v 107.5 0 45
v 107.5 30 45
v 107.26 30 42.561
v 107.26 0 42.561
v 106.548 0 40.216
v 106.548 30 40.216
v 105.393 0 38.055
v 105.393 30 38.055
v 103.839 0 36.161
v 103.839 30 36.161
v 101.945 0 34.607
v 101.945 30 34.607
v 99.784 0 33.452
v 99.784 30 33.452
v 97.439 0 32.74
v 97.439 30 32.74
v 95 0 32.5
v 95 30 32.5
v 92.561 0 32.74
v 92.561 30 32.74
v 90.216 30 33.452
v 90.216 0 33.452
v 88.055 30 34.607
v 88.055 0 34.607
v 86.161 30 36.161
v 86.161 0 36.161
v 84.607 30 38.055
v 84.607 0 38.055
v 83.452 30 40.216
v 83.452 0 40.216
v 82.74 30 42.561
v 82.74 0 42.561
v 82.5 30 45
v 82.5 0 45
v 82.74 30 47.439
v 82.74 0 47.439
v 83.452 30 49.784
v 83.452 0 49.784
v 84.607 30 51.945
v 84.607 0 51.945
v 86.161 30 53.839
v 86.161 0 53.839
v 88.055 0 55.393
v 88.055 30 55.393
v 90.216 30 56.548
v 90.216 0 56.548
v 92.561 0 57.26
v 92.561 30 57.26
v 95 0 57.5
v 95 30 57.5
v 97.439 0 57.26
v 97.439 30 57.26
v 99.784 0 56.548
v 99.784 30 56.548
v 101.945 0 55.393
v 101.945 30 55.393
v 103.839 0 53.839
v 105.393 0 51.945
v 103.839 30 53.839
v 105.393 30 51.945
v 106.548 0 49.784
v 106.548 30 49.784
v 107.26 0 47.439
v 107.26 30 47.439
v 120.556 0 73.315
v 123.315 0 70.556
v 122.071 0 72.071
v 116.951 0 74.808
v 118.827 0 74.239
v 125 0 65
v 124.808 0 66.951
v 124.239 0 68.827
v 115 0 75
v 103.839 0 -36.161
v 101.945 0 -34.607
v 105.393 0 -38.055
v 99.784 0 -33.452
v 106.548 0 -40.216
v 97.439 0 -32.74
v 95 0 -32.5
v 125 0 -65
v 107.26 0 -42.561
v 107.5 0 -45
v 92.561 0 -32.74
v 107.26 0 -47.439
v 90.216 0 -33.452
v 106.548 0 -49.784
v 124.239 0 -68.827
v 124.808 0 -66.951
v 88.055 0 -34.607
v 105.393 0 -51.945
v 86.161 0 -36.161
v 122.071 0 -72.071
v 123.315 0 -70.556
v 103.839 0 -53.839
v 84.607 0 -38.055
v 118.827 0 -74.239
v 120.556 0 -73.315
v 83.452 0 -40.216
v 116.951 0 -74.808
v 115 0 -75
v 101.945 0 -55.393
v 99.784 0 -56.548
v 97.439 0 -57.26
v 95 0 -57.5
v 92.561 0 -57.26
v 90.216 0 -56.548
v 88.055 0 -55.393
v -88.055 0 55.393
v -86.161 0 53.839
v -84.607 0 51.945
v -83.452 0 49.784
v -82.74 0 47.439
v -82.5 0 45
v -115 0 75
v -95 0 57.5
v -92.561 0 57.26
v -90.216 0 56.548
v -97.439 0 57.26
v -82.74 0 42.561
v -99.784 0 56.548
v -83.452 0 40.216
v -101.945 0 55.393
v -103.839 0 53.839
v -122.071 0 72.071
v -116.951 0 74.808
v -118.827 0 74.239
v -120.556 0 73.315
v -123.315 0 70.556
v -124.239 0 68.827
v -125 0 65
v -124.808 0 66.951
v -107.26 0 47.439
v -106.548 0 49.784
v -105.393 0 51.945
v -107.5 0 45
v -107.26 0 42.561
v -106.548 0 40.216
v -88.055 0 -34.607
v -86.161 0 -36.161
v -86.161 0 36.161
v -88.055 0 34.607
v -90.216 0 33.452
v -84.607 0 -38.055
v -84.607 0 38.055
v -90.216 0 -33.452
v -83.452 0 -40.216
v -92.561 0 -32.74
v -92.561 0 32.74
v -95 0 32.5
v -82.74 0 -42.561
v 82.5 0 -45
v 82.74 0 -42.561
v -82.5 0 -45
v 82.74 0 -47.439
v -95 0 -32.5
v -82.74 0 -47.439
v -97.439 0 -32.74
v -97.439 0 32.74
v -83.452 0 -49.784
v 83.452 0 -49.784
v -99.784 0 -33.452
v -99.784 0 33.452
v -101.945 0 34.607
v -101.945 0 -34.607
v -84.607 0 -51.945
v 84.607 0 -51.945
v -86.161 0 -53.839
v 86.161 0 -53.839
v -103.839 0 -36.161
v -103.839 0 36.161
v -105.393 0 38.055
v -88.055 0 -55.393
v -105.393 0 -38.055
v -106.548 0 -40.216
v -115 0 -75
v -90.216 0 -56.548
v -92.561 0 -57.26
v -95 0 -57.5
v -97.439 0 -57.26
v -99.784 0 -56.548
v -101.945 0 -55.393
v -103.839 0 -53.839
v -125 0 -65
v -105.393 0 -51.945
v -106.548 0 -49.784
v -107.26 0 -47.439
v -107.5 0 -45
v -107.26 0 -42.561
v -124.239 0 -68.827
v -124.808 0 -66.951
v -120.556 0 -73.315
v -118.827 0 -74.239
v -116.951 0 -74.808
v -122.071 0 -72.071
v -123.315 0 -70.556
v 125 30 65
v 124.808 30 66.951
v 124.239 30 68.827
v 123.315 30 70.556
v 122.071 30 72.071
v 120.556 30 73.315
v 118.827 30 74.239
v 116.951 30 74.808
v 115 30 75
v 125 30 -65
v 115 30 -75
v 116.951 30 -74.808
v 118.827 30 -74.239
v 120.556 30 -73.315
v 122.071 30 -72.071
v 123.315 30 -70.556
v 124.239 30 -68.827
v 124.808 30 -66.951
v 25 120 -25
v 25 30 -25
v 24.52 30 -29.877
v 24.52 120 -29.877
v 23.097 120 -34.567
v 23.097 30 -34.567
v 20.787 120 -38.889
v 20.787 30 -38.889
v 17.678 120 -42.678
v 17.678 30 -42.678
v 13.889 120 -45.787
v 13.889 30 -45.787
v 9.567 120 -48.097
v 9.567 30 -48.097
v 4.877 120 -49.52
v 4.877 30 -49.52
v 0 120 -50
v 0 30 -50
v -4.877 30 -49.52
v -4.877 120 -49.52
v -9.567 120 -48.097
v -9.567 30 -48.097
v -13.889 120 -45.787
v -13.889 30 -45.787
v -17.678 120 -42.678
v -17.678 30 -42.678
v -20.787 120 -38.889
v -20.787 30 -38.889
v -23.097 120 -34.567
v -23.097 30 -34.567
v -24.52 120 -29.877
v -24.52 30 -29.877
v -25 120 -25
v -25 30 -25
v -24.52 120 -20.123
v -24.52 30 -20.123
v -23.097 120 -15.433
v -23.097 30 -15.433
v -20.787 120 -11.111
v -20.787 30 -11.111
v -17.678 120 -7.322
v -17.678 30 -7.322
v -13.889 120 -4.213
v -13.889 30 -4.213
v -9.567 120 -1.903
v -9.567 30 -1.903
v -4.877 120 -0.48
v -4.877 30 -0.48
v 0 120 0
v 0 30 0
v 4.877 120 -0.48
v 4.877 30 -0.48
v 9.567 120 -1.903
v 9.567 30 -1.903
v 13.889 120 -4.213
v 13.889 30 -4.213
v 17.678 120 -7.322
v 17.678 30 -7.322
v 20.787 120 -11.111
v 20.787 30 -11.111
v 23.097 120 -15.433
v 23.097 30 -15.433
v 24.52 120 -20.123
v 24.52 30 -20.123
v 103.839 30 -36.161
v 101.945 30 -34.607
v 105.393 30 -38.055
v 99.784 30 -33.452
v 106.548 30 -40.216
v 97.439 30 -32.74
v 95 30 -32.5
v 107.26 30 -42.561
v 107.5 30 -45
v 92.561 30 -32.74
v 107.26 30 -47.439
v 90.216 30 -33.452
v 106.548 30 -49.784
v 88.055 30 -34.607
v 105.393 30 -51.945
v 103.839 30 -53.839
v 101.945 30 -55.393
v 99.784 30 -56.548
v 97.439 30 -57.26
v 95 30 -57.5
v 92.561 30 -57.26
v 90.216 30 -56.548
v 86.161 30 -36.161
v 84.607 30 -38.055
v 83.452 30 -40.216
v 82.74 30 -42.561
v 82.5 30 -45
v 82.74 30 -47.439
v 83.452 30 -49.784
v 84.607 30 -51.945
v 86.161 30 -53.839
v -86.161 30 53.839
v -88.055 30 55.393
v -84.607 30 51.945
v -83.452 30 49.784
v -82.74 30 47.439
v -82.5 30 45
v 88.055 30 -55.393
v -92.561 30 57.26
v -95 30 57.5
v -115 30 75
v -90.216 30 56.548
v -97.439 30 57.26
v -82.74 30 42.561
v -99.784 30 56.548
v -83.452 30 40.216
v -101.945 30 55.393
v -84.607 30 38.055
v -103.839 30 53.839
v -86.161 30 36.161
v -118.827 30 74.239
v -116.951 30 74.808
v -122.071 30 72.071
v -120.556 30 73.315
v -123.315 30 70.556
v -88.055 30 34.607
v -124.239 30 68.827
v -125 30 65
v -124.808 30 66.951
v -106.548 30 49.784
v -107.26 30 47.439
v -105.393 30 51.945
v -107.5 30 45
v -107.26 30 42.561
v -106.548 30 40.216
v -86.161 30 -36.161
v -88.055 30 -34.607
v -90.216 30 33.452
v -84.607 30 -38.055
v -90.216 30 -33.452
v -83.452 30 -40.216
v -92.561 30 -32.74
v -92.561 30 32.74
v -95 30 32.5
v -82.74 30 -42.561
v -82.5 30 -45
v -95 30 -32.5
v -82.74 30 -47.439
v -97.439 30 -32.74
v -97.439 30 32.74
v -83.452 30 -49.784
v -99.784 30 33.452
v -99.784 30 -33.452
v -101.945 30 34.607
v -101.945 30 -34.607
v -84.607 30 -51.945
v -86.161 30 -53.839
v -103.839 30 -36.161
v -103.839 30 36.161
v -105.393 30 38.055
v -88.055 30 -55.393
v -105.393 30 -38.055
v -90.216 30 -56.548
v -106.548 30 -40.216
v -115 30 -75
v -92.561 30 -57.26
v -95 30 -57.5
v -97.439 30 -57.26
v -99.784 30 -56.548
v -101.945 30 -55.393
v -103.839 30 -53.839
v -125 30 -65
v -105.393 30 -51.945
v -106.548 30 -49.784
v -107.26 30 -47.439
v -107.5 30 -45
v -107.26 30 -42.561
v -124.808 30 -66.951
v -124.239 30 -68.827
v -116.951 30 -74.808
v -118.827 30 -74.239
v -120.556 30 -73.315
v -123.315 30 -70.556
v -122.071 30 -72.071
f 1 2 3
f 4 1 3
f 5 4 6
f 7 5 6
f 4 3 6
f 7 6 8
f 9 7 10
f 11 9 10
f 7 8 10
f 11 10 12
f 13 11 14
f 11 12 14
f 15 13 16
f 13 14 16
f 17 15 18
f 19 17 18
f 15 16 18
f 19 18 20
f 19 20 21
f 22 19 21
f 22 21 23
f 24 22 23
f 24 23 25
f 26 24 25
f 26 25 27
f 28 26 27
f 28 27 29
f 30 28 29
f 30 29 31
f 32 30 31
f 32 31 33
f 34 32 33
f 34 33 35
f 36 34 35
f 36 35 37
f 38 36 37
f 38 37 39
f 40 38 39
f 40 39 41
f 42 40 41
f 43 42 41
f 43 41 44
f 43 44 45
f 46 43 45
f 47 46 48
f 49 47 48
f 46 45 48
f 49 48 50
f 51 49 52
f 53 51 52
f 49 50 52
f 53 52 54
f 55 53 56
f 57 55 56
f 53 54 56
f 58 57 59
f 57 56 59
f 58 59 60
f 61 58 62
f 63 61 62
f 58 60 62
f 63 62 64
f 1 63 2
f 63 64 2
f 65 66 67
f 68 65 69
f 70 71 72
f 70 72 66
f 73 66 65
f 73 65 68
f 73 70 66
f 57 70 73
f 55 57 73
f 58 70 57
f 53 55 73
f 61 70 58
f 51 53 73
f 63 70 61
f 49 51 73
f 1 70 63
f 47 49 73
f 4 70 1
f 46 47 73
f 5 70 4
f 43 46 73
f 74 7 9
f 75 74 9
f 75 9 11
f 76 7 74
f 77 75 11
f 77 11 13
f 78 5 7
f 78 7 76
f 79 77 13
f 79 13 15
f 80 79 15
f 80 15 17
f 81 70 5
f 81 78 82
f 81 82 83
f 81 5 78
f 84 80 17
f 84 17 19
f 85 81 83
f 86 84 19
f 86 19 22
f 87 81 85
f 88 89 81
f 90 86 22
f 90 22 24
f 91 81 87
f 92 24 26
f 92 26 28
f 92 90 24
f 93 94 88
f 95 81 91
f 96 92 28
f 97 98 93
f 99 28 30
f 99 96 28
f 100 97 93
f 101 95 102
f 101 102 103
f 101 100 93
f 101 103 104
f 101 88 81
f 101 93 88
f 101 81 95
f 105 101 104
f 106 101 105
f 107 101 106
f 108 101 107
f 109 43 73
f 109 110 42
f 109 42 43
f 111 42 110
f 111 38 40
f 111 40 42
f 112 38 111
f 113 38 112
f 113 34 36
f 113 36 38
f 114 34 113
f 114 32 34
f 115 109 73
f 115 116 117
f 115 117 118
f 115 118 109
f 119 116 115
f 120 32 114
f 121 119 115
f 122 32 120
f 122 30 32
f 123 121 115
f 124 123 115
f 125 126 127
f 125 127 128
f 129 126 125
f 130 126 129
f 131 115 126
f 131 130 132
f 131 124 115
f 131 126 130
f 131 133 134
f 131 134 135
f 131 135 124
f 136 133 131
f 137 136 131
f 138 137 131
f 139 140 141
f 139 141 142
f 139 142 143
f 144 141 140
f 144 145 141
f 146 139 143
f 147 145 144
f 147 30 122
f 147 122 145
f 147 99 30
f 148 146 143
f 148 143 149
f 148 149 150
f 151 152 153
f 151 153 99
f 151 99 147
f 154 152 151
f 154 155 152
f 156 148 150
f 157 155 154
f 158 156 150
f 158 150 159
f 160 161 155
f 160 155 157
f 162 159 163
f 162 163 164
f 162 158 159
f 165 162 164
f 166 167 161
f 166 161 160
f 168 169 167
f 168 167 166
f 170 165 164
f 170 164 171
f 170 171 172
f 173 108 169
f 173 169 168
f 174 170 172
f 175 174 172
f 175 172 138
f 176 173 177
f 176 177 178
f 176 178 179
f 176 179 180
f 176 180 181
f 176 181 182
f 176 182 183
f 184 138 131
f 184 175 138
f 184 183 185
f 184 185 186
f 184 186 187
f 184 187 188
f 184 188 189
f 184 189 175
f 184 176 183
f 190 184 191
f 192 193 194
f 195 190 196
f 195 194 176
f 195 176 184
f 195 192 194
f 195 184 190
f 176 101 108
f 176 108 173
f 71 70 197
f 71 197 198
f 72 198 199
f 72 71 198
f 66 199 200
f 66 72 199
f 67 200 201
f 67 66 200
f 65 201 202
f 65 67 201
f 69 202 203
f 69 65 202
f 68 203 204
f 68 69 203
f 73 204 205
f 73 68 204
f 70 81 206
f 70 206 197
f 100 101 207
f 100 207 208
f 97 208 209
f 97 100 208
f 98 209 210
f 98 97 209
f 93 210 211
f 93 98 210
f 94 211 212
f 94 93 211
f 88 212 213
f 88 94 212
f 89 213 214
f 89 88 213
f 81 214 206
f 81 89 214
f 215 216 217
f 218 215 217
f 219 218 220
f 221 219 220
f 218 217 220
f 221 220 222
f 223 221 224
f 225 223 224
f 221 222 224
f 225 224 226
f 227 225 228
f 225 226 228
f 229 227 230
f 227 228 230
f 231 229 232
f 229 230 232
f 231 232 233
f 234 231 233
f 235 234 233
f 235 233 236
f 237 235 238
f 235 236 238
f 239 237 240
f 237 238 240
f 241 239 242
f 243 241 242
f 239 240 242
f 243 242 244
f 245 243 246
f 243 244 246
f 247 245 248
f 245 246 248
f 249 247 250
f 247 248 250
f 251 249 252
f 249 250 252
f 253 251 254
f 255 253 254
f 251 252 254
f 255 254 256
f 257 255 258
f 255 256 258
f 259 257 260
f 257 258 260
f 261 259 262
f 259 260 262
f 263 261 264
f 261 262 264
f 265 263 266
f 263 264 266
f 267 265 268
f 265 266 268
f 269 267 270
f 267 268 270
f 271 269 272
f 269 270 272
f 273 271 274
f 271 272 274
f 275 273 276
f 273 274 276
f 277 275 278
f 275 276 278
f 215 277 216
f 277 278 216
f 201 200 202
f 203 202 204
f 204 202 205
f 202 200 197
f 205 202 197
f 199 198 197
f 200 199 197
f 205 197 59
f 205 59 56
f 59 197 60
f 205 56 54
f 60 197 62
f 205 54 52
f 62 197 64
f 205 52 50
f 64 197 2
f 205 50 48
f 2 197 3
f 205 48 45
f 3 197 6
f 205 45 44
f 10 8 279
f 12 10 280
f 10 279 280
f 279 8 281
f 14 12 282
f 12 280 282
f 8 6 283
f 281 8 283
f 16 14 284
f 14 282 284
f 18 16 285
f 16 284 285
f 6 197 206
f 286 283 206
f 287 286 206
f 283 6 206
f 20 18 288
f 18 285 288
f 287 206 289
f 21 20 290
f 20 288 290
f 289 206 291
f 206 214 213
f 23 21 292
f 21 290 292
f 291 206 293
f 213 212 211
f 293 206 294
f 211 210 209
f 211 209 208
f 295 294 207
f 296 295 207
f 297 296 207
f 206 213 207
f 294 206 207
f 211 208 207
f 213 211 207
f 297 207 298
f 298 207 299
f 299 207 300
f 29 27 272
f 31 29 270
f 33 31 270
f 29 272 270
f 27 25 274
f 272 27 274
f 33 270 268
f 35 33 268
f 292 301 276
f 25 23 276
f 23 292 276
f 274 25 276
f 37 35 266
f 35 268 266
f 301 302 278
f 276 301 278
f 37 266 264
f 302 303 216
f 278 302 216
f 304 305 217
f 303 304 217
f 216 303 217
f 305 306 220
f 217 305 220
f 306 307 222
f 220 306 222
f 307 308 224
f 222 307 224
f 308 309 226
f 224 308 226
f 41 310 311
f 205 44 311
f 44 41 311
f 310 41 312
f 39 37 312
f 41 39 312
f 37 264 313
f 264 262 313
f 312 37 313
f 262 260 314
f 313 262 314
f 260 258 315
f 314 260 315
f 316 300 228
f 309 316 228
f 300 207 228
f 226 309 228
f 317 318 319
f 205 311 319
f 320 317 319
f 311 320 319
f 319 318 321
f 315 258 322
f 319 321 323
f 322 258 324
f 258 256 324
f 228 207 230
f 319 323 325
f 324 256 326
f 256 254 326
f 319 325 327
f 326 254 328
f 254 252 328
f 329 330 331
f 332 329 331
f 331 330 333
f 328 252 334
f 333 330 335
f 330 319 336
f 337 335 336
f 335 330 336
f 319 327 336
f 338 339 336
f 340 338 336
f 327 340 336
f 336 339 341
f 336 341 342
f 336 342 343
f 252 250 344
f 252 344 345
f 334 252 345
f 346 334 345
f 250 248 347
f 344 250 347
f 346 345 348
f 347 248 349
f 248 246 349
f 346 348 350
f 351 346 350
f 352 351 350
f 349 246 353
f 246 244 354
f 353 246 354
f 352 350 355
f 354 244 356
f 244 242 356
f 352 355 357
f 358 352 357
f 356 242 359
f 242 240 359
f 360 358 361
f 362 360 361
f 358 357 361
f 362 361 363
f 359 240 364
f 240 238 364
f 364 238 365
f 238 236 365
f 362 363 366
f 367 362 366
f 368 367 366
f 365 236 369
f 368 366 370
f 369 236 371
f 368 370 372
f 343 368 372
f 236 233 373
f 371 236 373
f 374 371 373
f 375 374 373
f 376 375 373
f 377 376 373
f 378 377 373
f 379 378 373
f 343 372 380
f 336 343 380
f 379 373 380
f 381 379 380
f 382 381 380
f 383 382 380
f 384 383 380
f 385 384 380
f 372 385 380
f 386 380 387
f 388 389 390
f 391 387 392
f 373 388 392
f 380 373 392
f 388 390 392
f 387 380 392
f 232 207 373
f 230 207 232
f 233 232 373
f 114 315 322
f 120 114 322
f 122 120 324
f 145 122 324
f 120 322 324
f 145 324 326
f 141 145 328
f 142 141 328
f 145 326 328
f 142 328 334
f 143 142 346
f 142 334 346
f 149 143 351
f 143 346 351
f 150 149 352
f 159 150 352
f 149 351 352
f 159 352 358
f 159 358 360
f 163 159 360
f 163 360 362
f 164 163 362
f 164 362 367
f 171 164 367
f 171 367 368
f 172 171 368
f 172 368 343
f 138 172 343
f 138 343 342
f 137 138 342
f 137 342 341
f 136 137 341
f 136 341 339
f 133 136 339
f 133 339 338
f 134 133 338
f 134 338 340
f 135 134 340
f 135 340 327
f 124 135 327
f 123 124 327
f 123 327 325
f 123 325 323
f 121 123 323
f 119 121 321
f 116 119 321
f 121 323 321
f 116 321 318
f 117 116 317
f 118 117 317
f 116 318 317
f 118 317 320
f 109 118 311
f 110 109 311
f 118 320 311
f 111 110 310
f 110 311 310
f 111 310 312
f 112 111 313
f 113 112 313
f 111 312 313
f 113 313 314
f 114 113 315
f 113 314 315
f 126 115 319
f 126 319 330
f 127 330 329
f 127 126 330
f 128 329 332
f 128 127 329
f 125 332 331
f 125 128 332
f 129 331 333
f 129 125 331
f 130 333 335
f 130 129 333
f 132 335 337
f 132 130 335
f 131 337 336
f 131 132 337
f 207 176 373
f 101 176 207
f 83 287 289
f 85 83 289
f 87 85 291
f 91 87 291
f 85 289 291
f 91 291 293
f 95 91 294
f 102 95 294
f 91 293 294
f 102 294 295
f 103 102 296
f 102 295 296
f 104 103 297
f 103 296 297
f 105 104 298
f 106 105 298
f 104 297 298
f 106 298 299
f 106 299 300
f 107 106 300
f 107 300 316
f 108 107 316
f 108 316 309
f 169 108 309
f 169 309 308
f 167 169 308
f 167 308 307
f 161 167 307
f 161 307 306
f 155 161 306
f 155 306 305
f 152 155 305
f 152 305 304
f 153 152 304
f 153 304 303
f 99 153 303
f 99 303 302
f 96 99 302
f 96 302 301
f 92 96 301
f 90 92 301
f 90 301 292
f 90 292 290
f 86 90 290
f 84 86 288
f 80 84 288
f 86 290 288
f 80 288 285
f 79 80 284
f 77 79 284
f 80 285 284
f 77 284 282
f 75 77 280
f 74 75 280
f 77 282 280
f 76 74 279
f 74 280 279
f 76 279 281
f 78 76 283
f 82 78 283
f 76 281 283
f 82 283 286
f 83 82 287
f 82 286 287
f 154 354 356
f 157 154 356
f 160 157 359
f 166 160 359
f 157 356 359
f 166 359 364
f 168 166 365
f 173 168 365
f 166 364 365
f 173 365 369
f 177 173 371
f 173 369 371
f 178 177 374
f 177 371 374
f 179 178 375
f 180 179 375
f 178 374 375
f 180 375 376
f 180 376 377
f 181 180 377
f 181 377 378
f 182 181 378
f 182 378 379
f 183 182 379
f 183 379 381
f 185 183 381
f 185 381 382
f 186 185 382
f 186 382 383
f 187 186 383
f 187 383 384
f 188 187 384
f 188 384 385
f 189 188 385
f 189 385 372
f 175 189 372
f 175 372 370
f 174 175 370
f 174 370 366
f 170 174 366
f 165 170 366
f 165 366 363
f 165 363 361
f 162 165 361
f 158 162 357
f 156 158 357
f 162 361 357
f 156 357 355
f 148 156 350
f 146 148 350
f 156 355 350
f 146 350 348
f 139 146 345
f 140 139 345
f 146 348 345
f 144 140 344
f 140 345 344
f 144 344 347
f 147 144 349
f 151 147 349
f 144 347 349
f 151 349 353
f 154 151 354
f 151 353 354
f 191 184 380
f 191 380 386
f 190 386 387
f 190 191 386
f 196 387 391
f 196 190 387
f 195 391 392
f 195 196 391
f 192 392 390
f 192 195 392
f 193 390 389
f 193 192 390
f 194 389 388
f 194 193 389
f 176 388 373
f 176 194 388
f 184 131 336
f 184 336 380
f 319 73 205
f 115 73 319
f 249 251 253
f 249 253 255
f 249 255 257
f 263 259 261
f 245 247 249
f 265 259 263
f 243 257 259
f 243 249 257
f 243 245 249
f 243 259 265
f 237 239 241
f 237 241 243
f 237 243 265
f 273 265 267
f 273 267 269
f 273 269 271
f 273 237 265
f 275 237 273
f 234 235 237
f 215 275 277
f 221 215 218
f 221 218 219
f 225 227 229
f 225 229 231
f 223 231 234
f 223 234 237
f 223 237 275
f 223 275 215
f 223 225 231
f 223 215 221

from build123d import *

# Parameters (mm, degrees)
BOSS_EXTRUDE1_DEPTH = 30
SKETCH2_R           = 25
BOSS_EXTRUDE2_DEPTH = 90
SKETCH3_R           = 12.5
CUT_EXTRUDE1_DEPTH  = 31


with BuildPart() as part:
    # Sketch1 → Boss-Extrude1 (new body)
    with BuildSketch(Plane(origin=(0, 0, 0), x_dir=(1, 0, 0), z_dir=(0, 1, 0))):
        with BuildLine():
            Line((115, -75), (-115, -75))
            ThreePointArc((-115, -75), (-122.071067812, -72.071067812), (-125, -65))
            Line((-125, -65), (-125, 65))
            ThreePointArc((-125, 65), (-122.071067812, 72.071067812), (-115, 75))
            Line((-115, 75), (115, 75))
            ThreePointArc((115, 75), (122.071067812, 72.071067812), (125, 65))
            Line((125, 65), (125, -65))
            ThreePointArc((125, -65), (122.071067812, -72.071067812), (115, -75))
        make_face()
    extrude(amount=BOSS_EXTRUDE1_DEPTH)

    # Sketch2 → Boss-Extrude2 (add)
    with BuildSketch(Plane(origin=(0, 30, 0), x_dir=(1, 0, 0), z_dir=(0, 1, 0))):
        with Locations((0, 25)):
            Circle(SKETCH2_R)
    extrude(amount=BOSS_EXTRUDE2_DEPTH)

    # Sketch3 → Cut-Extrude1 (cut, through all)
    with BuildSketch(Plane(origin=(0, 30, 0), x_dir=(1, 0, 0), z_dir=(0, 1, 0))):
        with Locations((-95, 45)):
            Circle(SKETCH3_R)
        with Locations((95, 45)):
            Circle(SKETCH3_R)
        with Locations((95, -45)):
            Circle(SKETCH3_R)
        with Locations((-95, -45)):
            Circle(SKETCH3_R)
    extrude(amount=-CUT_EXTRUDE1_DEPTH, mode=Mode.SUBTRACT)


solid = part.part
